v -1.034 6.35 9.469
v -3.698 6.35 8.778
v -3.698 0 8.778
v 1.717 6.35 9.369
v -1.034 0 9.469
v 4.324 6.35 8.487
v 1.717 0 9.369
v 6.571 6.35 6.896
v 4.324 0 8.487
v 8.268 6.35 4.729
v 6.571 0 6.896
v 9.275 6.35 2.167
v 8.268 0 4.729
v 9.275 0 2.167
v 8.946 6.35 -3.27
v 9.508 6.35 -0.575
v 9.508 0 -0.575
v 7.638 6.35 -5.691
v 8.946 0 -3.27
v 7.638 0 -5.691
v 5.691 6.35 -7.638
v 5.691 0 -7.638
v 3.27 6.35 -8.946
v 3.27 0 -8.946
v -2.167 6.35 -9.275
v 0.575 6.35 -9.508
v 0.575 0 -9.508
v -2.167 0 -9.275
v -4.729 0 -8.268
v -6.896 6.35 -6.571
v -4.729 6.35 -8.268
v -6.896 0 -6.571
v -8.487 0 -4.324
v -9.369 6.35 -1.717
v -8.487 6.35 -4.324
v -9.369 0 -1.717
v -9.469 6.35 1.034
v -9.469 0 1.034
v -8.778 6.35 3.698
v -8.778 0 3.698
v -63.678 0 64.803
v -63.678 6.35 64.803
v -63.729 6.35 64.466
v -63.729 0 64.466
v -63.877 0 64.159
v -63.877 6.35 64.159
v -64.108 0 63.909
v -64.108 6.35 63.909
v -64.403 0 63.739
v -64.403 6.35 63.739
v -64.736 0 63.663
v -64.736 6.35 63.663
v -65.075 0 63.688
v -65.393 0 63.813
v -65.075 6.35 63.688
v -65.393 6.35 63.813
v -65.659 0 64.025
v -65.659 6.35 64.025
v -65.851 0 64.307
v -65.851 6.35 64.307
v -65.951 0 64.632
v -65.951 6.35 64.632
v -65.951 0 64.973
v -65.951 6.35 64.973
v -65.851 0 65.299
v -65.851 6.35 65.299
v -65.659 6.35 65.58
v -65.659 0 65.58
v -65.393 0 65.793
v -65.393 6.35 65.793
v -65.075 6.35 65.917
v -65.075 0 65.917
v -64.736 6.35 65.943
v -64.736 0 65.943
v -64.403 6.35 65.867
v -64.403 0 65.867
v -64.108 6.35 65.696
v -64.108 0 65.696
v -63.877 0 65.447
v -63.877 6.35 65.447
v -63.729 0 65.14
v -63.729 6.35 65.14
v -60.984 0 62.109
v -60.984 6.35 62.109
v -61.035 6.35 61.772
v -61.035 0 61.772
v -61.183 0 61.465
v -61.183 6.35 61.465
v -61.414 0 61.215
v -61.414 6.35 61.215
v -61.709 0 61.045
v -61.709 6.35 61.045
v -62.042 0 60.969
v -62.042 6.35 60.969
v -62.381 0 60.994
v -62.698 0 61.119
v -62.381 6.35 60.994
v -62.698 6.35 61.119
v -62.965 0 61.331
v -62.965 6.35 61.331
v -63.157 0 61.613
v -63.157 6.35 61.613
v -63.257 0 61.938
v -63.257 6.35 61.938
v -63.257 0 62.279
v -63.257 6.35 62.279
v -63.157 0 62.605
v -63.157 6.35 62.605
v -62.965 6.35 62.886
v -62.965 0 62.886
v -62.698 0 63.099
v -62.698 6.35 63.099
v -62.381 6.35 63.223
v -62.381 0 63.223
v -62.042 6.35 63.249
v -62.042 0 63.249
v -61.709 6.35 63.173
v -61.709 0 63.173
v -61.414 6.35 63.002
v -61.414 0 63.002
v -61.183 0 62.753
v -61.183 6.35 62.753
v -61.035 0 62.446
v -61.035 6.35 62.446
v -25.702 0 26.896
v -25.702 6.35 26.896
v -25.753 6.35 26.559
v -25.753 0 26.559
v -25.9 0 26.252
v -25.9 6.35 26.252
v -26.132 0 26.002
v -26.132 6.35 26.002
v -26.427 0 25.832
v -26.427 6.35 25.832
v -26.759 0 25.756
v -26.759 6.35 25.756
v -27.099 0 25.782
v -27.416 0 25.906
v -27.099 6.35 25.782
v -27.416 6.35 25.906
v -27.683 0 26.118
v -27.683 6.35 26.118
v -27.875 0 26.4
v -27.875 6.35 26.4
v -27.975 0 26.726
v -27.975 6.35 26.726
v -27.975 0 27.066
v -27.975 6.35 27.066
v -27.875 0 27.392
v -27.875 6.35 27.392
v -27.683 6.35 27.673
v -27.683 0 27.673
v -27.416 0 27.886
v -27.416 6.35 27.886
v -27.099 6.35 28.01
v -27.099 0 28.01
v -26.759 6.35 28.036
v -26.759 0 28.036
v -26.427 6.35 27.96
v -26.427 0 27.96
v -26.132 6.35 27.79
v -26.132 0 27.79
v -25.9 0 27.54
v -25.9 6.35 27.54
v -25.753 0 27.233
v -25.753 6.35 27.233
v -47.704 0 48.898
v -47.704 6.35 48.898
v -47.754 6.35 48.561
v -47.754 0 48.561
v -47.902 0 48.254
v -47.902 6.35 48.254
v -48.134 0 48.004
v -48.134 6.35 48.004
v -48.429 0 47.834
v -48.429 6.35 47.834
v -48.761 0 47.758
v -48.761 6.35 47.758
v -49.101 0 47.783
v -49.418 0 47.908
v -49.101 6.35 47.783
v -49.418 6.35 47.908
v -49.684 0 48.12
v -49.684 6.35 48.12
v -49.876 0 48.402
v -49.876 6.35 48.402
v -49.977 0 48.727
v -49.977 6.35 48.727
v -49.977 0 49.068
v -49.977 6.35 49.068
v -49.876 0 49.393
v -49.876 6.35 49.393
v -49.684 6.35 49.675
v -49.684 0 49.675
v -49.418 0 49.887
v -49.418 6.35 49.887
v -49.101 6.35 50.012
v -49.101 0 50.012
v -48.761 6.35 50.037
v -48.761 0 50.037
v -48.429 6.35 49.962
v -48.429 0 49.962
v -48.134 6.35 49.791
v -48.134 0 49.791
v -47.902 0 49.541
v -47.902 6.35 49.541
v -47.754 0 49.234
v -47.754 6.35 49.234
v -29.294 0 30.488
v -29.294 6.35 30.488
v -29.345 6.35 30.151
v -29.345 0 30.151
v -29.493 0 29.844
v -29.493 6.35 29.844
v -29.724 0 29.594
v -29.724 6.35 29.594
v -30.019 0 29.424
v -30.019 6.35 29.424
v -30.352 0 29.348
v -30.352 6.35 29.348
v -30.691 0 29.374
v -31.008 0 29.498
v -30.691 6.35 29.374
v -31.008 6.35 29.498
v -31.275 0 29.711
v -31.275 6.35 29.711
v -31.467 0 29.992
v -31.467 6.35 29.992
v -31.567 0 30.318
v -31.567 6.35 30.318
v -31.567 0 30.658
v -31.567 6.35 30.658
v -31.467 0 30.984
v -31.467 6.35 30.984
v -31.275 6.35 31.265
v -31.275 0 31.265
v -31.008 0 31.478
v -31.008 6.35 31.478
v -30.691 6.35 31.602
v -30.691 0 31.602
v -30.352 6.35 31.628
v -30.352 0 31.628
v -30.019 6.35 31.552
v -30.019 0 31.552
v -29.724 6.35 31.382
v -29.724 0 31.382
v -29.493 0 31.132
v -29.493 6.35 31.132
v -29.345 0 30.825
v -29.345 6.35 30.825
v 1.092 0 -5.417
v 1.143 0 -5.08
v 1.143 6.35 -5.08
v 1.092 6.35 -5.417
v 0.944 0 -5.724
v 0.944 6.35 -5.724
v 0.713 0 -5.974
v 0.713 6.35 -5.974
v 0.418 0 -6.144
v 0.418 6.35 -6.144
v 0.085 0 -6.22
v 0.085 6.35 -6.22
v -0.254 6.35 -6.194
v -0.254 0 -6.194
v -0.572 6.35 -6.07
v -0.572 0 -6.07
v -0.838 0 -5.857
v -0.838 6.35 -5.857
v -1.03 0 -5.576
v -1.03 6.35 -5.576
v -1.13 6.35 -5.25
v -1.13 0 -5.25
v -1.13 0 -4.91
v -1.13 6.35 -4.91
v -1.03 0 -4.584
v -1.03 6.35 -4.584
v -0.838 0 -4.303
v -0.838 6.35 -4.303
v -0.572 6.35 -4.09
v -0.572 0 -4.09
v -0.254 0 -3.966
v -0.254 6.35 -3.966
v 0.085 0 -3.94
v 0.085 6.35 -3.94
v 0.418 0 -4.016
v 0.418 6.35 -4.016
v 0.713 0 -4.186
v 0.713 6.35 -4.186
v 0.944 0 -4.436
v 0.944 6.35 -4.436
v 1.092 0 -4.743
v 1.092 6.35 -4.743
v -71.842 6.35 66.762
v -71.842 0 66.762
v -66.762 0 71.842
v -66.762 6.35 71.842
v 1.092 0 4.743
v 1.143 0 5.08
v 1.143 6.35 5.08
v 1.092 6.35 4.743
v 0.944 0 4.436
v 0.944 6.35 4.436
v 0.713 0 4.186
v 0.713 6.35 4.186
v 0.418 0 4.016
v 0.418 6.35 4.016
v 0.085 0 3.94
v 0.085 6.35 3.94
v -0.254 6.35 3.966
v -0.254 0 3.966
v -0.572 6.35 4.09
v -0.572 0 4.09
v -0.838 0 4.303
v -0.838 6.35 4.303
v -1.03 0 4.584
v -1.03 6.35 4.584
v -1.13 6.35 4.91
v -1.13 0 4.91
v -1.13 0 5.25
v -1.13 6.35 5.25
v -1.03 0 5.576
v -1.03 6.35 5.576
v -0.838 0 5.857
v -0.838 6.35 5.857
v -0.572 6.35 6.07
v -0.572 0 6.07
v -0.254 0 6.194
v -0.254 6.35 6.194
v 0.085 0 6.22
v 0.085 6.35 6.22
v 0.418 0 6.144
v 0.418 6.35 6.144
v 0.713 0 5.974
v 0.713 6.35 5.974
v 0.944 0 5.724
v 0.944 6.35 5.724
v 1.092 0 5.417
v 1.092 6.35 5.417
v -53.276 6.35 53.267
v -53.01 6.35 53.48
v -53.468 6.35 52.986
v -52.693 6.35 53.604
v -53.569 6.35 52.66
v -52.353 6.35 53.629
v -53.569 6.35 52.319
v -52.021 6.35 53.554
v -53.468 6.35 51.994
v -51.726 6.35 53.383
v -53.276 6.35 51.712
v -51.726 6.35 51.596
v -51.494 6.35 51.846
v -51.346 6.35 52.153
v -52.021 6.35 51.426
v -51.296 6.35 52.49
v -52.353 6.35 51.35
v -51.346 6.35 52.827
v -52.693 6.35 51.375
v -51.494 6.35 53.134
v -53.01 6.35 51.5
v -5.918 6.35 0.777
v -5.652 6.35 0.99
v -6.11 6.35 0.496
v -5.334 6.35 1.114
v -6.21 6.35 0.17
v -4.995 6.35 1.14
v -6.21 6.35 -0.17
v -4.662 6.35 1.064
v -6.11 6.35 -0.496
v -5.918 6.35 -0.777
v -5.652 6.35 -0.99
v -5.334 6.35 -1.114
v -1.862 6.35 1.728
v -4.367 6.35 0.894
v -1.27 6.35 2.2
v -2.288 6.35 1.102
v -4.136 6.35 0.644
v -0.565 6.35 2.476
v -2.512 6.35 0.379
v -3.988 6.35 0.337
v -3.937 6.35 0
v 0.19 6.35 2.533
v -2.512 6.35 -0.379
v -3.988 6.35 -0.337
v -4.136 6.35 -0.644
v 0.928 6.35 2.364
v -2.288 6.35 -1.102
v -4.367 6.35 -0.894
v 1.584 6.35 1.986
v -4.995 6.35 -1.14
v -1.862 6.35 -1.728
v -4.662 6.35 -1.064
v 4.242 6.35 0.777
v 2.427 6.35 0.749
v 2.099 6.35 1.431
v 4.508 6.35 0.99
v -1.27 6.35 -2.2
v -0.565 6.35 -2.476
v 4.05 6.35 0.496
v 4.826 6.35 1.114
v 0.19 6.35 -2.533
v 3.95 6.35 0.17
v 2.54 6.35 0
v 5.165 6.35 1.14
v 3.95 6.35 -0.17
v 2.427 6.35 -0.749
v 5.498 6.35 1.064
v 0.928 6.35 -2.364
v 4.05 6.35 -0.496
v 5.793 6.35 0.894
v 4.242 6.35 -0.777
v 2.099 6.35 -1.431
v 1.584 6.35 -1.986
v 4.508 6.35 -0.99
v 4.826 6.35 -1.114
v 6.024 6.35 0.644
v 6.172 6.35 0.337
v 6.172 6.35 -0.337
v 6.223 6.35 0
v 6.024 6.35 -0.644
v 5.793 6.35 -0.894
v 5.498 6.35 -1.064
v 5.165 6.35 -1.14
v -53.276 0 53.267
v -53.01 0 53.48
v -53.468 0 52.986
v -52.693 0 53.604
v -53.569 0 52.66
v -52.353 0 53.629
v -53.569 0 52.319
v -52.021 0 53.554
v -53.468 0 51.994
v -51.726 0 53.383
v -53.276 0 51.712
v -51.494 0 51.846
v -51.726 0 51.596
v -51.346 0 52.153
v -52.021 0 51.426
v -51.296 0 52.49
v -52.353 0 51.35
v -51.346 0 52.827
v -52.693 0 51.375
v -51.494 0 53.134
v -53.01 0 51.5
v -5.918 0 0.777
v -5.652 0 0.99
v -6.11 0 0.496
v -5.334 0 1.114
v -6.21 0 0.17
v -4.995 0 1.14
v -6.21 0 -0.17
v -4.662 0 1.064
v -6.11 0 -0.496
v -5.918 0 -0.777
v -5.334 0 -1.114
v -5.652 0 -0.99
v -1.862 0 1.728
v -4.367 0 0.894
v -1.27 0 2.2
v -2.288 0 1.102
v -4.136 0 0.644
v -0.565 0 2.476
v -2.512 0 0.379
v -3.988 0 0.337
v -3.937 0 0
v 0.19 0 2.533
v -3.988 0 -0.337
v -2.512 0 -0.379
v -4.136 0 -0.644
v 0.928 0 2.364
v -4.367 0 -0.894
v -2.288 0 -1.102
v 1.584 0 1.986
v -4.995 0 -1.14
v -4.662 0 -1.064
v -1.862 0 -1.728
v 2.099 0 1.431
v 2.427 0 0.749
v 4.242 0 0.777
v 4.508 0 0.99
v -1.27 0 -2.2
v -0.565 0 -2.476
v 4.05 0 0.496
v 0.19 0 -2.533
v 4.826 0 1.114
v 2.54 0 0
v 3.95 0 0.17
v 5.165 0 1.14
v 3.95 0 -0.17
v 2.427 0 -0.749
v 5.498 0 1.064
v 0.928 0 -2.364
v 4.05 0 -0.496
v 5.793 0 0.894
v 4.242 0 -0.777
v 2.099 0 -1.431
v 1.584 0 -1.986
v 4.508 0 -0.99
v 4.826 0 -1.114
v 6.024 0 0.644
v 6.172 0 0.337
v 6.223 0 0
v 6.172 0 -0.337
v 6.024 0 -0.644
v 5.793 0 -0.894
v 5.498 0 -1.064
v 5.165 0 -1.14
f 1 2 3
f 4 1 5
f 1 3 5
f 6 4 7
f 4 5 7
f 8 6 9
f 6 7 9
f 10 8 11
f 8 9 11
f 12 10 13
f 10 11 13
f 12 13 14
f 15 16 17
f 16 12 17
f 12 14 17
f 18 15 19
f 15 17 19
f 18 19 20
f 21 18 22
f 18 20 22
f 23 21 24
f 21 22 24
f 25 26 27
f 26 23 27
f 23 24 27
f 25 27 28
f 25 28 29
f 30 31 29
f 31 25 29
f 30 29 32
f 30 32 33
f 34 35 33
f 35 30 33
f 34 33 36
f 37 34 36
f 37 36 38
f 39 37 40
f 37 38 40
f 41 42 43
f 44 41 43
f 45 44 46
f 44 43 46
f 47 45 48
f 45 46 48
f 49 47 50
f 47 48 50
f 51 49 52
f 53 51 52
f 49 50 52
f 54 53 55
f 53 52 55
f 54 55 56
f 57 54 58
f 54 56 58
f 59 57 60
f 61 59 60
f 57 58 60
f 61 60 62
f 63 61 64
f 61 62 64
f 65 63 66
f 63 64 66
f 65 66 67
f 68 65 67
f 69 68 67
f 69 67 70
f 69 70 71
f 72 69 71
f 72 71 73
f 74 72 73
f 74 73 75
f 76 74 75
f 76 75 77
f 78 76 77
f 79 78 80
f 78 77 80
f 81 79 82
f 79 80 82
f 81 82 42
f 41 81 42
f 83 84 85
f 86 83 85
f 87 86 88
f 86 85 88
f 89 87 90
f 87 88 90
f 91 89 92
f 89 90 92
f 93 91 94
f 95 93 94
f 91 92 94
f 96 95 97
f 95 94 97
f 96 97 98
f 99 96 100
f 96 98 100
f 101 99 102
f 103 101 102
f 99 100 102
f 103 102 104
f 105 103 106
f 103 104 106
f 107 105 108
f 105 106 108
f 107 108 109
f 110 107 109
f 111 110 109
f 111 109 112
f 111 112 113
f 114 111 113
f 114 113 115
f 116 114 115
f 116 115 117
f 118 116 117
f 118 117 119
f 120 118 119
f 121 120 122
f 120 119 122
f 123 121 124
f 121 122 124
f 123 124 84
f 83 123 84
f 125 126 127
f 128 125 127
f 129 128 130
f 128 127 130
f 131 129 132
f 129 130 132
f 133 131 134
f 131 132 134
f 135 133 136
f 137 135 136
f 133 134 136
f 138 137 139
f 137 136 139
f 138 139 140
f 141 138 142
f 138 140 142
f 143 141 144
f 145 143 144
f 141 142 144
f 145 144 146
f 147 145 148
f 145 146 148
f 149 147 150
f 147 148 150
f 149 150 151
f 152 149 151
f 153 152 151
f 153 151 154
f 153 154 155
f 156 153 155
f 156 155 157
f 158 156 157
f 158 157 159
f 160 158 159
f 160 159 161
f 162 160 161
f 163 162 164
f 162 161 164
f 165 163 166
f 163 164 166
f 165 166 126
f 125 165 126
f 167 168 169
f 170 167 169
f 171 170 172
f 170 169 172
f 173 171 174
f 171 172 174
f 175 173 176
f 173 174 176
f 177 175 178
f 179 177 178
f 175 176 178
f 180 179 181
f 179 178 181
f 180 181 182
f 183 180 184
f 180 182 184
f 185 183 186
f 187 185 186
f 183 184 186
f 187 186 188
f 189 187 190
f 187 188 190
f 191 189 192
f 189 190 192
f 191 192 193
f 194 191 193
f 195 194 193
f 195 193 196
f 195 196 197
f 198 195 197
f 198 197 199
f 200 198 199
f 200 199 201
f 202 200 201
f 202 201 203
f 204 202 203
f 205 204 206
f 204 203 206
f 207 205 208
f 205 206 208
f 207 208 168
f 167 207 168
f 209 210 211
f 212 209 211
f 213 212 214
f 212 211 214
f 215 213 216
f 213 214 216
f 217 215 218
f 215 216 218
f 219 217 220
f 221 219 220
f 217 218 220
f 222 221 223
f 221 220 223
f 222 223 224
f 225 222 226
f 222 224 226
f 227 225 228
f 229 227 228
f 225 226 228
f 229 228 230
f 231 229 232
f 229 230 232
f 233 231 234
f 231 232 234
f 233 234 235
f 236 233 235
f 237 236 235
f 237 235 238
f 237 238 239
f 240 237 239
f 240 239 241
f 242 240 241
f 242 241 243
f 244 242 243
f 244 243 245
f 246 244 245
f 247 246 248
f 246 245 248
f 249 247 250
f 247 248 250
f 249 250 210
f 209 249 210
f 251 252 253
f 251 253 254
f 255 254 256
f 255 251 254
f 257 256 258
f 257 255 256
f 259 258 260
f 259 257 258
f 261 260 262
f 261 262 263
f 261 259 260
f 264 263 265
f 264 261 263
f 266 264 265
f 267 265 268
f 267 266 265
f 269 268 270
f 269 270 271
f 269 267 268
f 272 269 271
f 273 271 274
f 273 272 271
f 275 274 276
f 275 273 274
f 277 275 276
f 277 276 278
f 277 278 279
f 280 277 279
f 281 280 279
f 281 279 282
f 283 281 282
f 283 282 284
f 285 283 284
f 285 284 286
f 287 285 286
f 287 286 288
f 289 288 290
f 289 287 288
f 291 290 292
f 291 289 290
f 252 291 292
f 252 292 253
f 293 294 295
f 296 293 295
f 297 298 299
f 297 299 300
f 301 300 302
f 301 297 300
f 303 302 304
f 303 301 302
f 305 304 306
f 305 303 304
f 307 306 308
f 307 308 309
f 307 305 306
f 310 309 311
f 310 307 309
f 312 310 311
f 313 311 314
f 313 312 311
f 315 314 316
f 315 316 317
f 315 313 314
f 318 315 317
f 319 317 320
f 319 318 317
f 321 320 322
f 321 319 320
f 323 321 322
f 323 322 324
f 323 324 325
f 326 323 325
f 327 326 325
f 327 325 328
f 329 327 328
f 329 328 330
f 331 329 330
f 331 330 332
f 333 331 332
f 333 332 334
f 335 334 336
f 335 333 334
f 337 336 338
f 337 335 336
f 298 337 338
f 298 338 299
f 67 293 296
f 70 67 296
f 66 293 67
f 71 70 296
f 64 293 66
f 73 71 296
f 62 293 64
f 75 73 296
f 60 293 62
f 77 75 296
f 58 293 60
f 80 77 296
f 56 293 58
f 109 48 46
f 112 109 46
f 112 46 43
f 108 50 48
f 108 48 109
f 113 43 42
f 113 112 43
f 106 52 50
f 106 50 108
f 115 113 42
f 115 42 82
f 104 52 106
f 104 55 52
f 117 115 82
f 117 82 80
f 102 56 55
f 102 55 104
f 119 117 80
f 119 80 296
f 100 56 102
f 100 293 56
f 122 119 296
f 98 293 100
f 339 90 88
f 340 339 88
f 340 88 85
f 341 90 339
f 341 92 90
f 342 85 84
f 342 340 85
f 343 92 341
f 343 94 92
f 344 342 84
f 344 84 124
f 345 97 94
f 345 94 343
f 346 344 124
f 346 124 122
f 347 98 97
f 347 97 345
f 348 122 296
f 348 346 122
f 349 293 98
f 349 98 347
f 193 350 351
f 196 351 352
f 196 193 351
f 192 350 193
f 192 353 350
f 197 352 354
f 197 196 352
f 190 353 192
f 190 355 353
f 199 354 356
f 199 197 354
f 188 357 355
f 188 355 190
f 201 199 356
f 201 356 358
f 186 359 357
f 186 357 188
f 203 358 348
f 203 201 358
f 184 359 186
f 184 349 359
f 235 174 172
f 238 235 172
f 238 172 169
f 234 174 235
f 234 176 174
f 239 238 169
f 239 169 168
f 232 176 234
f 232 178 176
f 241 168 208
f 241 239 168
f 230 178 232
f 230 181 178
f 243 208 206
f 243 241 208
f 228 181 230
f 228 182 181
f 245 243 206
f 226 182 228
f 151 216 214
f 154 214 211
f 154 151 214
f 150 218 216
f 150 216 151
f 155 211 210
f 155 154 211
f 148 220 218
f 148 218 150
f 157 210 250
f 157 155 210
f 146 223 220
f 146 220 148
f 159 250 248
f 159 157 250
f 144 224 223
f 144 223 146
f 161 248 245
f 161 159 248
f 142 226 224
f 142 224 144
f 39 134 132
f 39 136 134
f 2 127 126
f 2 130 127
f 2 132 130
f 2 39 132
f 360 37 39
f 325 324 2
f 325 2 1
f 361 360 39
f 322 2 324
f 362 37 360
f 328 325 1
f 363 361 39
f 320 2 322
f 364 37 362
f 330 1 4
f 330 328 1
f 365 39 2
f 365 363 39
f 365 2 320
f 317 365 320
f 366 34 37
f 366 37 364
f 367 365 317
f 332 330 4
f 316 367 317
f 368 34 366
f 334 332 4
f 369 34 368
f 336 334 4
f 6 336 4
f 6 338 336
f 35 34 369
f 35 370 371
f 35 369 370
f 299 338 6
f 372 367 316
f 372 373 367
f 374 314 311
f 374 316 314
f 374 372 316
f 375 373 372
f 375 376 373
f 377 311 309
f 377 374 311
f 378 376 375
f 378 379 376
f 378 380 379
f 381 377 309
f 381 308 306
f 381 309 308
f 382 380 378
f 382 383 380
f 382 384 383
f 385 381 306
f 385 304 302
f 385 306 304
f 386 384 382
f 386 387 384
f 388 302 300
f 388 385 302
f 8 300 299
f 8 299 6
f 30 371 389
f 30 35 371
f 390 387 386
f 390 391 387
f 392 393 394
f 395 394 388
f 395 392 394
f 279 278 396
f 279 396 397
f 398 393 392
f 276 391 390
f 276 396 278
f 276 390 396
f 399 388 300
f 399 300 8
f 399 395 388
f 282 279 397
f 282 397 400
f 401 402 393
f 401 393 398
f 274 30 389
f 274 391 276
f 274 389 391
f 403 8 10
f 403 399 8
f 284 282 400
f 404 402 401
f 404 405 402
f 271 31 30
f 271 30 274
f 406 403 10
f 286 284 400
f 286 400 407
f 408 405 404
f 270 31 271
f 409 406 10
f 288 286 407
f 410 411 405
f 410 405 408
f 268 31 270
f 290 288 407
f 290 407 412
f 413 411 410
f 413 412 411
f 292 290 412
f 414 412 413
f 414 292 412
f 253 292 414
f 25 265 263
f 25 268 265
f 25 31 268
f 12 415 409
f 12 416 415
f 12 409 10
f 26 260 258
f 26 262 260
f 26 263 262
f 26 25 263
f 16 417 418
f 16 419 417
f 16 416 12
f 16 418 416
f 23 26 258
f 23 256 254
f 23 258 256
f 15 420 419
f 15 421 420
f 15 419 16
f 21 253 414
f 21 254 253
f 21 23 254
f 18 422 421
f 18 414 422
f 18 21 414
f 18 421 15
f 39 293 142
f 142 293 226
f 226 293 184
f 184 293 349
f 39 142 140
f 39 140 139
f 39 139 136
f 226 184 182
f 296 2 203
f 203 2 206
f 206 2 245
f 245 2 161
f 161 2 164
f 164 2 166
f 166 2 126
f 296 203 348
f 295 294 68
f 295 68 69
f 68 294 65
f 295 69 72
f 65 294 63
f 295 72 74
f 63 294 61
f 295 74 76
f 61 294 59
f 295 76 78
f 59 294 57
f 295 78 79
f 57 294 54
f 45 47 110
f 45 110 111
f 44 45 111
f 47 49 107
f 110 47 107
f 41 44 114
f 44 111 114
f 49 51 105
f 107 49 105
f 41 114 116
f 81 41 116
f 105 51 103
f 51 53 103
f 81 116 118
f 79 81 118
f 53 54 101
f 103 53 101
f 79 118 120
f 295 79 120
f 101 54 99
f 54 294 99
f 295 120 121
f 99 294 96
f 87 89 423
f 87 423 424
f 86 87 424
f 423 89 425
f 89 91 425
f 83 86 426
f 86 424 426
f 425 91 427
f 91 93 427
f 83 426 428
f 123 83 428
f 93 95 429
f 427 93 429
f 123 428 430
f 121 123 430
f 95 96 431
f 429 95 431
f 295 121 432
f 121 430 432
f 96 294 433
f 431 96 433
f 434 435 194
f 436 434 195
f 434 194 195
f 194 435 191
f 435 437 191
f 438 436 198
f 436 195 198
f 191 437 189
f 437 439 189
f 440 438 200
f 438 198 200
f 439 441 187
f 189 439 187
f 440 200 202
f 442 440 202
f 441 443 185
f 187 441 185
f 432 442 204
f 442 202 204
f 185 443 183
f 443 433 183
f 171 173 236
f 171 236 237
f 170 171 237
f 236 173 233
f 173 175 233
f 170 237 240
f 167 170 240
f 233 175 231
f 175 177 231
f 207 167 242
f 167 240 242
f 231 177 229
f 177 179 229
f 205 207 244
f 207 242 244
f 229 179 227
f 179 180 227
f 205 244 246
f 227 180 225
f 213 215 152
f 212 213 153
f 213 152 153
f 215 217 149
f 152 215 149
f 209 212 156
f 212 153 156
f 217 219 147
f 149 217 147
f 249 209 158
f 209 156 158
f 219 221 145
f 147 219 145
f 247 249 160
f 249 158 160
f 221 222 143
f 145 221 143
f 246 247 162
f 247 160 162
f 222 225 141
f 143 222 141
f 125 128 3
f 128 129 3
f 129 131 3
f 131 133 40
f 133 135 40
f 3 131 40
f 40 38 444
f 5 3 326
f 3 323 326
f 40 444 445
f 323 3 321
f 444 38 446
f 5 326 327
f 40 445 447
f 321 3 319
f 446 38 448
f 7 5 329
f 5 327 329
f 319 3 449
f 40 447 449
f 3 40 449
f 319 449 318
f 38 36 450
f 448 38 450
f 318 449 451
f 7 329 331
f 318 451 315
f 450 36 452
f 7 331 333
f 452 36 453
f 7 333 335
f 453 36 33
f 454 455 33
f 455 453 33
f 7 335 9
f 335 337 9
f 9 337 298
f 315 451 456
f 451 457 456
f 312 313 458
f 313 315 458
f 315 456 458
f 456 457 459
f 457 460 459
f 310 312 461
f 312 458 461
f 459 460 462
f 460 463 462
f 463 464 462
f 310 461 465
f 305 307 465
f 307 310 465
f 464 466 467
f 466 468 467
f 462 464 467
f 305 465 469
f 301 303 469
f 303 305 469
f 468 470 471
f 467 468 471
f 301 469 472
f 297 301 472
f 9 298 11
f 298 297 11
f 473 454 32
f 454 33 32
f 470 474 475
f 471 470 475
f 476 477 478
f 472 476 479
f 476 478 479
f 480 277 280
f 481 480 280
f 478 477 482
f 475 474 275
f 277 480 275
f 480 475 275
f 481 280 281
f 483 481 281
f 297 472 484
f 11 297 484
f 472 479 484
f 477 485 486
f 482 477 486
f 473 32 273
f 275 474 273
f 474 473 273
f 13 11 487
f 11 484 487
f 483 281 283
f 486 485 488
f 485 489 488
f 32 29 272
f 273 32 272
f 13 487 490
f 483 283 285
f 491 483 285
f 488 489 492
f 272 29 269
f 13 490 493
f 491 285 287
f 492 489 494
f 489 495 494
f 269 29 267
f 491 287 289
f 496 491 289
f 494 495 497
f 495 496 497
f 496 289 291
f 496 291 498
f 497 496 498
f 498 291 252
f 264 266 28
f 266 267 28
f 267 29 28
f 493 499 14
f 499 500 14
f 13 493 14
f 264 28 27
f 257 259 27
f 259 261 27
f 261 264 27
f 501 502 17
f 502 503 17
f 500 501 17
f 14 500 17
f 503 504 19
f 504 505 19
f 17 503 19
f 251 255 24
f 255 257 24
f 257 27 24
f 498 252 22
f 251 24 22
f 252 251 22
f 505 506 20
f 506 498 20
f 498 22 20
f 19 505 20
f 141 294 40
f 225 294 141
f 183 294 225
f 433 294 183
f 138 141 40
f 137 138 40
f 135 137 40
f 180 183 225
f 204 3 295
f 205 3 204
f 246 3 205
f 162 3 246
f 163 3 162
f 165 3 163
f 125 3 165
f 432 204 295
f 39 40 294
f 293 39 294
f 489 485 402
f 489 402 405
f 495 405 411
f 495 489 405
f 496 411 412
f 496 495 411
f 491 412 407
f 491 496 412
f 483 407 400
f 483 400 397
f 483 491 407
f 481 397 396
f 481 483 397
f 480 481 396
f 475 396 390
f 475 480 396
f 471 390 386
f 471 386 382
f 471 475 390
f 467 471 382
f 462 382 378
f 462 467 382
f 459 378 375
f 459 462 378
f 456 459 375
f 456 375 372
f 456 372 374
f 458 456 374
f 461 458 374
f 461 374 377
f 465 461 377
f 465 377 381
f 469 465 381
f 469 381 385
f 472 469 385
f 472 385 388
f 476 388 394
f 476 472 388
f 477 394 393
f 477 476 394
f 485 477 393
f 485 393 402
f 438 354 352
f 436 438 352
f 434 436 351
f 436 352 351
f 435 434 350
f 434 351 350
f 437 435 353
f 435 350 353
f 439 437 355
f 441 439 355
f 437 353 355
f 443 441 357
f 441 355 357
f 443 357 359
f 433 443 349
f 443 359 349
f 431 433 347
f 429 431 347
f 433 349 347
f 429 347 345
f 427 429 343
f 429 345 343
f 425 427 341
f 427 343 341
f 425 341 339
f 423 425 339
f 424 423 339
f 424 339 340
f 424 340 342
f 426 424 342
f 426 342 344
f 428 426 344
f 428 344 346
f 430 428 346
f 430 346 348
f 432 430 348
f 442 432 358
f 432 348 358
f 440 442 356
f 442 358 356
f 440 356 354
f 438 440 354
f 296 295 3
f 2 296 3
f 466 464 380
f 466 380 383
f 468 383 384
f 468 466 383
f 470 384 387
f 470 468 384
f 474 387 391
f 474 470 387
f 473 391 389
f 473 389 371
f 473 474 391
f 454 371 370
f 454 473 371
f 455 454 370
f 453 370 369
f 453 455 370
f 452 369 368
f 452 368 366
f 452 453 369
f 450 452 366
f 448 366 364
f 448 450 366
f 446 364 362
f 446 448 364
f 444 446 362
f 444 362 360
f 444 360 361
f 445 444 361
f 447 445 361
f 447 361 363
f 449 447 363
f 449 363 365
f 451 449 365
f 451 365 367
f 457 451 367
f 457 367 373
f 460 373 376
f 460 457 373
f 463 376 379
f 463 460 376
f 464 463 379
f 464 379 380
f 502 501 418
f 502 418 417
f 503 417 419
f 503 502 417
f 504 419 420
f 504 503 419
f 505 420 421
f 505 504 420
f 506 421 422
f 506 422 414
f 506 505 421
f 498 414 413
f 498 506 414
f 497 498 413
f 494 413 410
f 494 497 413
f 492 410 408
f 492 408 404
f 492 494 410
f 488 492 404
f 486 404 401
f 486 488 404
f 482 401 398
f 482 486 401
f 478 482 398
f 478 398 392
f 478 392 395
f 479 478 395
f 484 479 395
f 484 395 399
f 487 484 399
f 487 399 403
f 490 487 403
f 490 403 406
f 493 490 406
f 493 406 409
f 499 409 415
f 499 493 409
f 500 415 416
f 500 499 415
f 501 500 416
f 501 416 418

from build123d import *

# Parameters (mm, degrees)
SKETCH1_R           = 9.525
SKETCH1_R_2         = 2.54
SKETCH1_R_3         = 1.143
BOSS_EXTRUDE1_DEPTH = 6.35
BOSS_EXTRUDE2_DEPTH = 6.35
SKETCH4_R           = 1.143
CUT_EXTRUDE1_DEPTH  = 6.35


with BuildPart() as part:
    # Sketch1 → Boss-Extrude1 (new body)
    with BuildSketch(Plane(origin=(0, 0, 0), x_dir=(1, 0, 0), z_dir=(0, 1, 0))):
        Circle(SKETCH1_R)
        Circle(SKETCH1_R_2, mode=Mode.SUBTRACT)
        with Locations((-5.08, 0)):
            Circle(SKETCH1_R_3, mode=Mode.SUBTRACT)
        with Locations((0, 5.08)):
            Circle(SKETCH1_R_3, mode=Mode.SUBTRACT)
        with Locations((5.08, 0)):
            Circle(SKETCH1_R_3, mode=Mode.SUBTRACT)
        with Locations((0, -5.08)):
            Circle(SKETCH1_R_3, mode=Mode.SUBTRACT)
    extrude(amount=BOSS_EXTRUDE1_DEPTH)

    # Sketch3 → Boss-Extrude2 (add)
    with BuildSketch(Plane(origin=(0, 0, 0), x_dir=(1, 0, 0), z_dir=(0, 1, 0))):
        with BuildLine():
            ThreePointArc((-3.697885259, -8.777885259), (-6.735192091, -6.735192091), (-8.777885259, -3.697885259))
            Line((-8.777885259, -3.697885259), (-71.842048969, -66.762048969))
            Line((-71.842048969, -66.762048969), (-66.762048969, -71.842048969))
            Line((-66.762048969, -71.842048969), (-3.697885259, -8.777885259))
        make_face()
    extrude(amount=BOSS_EXTRUDE2_DEPTH)

    # Sketch4 → Cut-Extrude1 (cut)
    with BuildSketch(Plane(origin=(0, 6.35, 0), x_dir=(1, 0, 0), z_dir=(0, 1, 0))):
        with Locations((-64.821029526, -64.80281229)):
            Circle(SKETCH4_R)
        with Locations((-62.126952689, -62.108735454)):
            Circle(SKETCH4_R)
        with Locations((-52.438602593, -52.489659165)):
            Circle(SKETCH4_R)
        with Locations((-48.846500144, -48.897556717)):
            Circle(SKETCH4_R)
        with Locations((-30.436975096, -30.488031668)):
            Circle(SKETCH4_R)
        with Locations((-26.844872648, -26.89592922)):
            Circle(SKETCH4_R)
    extrude(amount=-CUT_EXTRUDE1_DEPTH, mode=Mode.SUBTRACT)


solid = part.part
